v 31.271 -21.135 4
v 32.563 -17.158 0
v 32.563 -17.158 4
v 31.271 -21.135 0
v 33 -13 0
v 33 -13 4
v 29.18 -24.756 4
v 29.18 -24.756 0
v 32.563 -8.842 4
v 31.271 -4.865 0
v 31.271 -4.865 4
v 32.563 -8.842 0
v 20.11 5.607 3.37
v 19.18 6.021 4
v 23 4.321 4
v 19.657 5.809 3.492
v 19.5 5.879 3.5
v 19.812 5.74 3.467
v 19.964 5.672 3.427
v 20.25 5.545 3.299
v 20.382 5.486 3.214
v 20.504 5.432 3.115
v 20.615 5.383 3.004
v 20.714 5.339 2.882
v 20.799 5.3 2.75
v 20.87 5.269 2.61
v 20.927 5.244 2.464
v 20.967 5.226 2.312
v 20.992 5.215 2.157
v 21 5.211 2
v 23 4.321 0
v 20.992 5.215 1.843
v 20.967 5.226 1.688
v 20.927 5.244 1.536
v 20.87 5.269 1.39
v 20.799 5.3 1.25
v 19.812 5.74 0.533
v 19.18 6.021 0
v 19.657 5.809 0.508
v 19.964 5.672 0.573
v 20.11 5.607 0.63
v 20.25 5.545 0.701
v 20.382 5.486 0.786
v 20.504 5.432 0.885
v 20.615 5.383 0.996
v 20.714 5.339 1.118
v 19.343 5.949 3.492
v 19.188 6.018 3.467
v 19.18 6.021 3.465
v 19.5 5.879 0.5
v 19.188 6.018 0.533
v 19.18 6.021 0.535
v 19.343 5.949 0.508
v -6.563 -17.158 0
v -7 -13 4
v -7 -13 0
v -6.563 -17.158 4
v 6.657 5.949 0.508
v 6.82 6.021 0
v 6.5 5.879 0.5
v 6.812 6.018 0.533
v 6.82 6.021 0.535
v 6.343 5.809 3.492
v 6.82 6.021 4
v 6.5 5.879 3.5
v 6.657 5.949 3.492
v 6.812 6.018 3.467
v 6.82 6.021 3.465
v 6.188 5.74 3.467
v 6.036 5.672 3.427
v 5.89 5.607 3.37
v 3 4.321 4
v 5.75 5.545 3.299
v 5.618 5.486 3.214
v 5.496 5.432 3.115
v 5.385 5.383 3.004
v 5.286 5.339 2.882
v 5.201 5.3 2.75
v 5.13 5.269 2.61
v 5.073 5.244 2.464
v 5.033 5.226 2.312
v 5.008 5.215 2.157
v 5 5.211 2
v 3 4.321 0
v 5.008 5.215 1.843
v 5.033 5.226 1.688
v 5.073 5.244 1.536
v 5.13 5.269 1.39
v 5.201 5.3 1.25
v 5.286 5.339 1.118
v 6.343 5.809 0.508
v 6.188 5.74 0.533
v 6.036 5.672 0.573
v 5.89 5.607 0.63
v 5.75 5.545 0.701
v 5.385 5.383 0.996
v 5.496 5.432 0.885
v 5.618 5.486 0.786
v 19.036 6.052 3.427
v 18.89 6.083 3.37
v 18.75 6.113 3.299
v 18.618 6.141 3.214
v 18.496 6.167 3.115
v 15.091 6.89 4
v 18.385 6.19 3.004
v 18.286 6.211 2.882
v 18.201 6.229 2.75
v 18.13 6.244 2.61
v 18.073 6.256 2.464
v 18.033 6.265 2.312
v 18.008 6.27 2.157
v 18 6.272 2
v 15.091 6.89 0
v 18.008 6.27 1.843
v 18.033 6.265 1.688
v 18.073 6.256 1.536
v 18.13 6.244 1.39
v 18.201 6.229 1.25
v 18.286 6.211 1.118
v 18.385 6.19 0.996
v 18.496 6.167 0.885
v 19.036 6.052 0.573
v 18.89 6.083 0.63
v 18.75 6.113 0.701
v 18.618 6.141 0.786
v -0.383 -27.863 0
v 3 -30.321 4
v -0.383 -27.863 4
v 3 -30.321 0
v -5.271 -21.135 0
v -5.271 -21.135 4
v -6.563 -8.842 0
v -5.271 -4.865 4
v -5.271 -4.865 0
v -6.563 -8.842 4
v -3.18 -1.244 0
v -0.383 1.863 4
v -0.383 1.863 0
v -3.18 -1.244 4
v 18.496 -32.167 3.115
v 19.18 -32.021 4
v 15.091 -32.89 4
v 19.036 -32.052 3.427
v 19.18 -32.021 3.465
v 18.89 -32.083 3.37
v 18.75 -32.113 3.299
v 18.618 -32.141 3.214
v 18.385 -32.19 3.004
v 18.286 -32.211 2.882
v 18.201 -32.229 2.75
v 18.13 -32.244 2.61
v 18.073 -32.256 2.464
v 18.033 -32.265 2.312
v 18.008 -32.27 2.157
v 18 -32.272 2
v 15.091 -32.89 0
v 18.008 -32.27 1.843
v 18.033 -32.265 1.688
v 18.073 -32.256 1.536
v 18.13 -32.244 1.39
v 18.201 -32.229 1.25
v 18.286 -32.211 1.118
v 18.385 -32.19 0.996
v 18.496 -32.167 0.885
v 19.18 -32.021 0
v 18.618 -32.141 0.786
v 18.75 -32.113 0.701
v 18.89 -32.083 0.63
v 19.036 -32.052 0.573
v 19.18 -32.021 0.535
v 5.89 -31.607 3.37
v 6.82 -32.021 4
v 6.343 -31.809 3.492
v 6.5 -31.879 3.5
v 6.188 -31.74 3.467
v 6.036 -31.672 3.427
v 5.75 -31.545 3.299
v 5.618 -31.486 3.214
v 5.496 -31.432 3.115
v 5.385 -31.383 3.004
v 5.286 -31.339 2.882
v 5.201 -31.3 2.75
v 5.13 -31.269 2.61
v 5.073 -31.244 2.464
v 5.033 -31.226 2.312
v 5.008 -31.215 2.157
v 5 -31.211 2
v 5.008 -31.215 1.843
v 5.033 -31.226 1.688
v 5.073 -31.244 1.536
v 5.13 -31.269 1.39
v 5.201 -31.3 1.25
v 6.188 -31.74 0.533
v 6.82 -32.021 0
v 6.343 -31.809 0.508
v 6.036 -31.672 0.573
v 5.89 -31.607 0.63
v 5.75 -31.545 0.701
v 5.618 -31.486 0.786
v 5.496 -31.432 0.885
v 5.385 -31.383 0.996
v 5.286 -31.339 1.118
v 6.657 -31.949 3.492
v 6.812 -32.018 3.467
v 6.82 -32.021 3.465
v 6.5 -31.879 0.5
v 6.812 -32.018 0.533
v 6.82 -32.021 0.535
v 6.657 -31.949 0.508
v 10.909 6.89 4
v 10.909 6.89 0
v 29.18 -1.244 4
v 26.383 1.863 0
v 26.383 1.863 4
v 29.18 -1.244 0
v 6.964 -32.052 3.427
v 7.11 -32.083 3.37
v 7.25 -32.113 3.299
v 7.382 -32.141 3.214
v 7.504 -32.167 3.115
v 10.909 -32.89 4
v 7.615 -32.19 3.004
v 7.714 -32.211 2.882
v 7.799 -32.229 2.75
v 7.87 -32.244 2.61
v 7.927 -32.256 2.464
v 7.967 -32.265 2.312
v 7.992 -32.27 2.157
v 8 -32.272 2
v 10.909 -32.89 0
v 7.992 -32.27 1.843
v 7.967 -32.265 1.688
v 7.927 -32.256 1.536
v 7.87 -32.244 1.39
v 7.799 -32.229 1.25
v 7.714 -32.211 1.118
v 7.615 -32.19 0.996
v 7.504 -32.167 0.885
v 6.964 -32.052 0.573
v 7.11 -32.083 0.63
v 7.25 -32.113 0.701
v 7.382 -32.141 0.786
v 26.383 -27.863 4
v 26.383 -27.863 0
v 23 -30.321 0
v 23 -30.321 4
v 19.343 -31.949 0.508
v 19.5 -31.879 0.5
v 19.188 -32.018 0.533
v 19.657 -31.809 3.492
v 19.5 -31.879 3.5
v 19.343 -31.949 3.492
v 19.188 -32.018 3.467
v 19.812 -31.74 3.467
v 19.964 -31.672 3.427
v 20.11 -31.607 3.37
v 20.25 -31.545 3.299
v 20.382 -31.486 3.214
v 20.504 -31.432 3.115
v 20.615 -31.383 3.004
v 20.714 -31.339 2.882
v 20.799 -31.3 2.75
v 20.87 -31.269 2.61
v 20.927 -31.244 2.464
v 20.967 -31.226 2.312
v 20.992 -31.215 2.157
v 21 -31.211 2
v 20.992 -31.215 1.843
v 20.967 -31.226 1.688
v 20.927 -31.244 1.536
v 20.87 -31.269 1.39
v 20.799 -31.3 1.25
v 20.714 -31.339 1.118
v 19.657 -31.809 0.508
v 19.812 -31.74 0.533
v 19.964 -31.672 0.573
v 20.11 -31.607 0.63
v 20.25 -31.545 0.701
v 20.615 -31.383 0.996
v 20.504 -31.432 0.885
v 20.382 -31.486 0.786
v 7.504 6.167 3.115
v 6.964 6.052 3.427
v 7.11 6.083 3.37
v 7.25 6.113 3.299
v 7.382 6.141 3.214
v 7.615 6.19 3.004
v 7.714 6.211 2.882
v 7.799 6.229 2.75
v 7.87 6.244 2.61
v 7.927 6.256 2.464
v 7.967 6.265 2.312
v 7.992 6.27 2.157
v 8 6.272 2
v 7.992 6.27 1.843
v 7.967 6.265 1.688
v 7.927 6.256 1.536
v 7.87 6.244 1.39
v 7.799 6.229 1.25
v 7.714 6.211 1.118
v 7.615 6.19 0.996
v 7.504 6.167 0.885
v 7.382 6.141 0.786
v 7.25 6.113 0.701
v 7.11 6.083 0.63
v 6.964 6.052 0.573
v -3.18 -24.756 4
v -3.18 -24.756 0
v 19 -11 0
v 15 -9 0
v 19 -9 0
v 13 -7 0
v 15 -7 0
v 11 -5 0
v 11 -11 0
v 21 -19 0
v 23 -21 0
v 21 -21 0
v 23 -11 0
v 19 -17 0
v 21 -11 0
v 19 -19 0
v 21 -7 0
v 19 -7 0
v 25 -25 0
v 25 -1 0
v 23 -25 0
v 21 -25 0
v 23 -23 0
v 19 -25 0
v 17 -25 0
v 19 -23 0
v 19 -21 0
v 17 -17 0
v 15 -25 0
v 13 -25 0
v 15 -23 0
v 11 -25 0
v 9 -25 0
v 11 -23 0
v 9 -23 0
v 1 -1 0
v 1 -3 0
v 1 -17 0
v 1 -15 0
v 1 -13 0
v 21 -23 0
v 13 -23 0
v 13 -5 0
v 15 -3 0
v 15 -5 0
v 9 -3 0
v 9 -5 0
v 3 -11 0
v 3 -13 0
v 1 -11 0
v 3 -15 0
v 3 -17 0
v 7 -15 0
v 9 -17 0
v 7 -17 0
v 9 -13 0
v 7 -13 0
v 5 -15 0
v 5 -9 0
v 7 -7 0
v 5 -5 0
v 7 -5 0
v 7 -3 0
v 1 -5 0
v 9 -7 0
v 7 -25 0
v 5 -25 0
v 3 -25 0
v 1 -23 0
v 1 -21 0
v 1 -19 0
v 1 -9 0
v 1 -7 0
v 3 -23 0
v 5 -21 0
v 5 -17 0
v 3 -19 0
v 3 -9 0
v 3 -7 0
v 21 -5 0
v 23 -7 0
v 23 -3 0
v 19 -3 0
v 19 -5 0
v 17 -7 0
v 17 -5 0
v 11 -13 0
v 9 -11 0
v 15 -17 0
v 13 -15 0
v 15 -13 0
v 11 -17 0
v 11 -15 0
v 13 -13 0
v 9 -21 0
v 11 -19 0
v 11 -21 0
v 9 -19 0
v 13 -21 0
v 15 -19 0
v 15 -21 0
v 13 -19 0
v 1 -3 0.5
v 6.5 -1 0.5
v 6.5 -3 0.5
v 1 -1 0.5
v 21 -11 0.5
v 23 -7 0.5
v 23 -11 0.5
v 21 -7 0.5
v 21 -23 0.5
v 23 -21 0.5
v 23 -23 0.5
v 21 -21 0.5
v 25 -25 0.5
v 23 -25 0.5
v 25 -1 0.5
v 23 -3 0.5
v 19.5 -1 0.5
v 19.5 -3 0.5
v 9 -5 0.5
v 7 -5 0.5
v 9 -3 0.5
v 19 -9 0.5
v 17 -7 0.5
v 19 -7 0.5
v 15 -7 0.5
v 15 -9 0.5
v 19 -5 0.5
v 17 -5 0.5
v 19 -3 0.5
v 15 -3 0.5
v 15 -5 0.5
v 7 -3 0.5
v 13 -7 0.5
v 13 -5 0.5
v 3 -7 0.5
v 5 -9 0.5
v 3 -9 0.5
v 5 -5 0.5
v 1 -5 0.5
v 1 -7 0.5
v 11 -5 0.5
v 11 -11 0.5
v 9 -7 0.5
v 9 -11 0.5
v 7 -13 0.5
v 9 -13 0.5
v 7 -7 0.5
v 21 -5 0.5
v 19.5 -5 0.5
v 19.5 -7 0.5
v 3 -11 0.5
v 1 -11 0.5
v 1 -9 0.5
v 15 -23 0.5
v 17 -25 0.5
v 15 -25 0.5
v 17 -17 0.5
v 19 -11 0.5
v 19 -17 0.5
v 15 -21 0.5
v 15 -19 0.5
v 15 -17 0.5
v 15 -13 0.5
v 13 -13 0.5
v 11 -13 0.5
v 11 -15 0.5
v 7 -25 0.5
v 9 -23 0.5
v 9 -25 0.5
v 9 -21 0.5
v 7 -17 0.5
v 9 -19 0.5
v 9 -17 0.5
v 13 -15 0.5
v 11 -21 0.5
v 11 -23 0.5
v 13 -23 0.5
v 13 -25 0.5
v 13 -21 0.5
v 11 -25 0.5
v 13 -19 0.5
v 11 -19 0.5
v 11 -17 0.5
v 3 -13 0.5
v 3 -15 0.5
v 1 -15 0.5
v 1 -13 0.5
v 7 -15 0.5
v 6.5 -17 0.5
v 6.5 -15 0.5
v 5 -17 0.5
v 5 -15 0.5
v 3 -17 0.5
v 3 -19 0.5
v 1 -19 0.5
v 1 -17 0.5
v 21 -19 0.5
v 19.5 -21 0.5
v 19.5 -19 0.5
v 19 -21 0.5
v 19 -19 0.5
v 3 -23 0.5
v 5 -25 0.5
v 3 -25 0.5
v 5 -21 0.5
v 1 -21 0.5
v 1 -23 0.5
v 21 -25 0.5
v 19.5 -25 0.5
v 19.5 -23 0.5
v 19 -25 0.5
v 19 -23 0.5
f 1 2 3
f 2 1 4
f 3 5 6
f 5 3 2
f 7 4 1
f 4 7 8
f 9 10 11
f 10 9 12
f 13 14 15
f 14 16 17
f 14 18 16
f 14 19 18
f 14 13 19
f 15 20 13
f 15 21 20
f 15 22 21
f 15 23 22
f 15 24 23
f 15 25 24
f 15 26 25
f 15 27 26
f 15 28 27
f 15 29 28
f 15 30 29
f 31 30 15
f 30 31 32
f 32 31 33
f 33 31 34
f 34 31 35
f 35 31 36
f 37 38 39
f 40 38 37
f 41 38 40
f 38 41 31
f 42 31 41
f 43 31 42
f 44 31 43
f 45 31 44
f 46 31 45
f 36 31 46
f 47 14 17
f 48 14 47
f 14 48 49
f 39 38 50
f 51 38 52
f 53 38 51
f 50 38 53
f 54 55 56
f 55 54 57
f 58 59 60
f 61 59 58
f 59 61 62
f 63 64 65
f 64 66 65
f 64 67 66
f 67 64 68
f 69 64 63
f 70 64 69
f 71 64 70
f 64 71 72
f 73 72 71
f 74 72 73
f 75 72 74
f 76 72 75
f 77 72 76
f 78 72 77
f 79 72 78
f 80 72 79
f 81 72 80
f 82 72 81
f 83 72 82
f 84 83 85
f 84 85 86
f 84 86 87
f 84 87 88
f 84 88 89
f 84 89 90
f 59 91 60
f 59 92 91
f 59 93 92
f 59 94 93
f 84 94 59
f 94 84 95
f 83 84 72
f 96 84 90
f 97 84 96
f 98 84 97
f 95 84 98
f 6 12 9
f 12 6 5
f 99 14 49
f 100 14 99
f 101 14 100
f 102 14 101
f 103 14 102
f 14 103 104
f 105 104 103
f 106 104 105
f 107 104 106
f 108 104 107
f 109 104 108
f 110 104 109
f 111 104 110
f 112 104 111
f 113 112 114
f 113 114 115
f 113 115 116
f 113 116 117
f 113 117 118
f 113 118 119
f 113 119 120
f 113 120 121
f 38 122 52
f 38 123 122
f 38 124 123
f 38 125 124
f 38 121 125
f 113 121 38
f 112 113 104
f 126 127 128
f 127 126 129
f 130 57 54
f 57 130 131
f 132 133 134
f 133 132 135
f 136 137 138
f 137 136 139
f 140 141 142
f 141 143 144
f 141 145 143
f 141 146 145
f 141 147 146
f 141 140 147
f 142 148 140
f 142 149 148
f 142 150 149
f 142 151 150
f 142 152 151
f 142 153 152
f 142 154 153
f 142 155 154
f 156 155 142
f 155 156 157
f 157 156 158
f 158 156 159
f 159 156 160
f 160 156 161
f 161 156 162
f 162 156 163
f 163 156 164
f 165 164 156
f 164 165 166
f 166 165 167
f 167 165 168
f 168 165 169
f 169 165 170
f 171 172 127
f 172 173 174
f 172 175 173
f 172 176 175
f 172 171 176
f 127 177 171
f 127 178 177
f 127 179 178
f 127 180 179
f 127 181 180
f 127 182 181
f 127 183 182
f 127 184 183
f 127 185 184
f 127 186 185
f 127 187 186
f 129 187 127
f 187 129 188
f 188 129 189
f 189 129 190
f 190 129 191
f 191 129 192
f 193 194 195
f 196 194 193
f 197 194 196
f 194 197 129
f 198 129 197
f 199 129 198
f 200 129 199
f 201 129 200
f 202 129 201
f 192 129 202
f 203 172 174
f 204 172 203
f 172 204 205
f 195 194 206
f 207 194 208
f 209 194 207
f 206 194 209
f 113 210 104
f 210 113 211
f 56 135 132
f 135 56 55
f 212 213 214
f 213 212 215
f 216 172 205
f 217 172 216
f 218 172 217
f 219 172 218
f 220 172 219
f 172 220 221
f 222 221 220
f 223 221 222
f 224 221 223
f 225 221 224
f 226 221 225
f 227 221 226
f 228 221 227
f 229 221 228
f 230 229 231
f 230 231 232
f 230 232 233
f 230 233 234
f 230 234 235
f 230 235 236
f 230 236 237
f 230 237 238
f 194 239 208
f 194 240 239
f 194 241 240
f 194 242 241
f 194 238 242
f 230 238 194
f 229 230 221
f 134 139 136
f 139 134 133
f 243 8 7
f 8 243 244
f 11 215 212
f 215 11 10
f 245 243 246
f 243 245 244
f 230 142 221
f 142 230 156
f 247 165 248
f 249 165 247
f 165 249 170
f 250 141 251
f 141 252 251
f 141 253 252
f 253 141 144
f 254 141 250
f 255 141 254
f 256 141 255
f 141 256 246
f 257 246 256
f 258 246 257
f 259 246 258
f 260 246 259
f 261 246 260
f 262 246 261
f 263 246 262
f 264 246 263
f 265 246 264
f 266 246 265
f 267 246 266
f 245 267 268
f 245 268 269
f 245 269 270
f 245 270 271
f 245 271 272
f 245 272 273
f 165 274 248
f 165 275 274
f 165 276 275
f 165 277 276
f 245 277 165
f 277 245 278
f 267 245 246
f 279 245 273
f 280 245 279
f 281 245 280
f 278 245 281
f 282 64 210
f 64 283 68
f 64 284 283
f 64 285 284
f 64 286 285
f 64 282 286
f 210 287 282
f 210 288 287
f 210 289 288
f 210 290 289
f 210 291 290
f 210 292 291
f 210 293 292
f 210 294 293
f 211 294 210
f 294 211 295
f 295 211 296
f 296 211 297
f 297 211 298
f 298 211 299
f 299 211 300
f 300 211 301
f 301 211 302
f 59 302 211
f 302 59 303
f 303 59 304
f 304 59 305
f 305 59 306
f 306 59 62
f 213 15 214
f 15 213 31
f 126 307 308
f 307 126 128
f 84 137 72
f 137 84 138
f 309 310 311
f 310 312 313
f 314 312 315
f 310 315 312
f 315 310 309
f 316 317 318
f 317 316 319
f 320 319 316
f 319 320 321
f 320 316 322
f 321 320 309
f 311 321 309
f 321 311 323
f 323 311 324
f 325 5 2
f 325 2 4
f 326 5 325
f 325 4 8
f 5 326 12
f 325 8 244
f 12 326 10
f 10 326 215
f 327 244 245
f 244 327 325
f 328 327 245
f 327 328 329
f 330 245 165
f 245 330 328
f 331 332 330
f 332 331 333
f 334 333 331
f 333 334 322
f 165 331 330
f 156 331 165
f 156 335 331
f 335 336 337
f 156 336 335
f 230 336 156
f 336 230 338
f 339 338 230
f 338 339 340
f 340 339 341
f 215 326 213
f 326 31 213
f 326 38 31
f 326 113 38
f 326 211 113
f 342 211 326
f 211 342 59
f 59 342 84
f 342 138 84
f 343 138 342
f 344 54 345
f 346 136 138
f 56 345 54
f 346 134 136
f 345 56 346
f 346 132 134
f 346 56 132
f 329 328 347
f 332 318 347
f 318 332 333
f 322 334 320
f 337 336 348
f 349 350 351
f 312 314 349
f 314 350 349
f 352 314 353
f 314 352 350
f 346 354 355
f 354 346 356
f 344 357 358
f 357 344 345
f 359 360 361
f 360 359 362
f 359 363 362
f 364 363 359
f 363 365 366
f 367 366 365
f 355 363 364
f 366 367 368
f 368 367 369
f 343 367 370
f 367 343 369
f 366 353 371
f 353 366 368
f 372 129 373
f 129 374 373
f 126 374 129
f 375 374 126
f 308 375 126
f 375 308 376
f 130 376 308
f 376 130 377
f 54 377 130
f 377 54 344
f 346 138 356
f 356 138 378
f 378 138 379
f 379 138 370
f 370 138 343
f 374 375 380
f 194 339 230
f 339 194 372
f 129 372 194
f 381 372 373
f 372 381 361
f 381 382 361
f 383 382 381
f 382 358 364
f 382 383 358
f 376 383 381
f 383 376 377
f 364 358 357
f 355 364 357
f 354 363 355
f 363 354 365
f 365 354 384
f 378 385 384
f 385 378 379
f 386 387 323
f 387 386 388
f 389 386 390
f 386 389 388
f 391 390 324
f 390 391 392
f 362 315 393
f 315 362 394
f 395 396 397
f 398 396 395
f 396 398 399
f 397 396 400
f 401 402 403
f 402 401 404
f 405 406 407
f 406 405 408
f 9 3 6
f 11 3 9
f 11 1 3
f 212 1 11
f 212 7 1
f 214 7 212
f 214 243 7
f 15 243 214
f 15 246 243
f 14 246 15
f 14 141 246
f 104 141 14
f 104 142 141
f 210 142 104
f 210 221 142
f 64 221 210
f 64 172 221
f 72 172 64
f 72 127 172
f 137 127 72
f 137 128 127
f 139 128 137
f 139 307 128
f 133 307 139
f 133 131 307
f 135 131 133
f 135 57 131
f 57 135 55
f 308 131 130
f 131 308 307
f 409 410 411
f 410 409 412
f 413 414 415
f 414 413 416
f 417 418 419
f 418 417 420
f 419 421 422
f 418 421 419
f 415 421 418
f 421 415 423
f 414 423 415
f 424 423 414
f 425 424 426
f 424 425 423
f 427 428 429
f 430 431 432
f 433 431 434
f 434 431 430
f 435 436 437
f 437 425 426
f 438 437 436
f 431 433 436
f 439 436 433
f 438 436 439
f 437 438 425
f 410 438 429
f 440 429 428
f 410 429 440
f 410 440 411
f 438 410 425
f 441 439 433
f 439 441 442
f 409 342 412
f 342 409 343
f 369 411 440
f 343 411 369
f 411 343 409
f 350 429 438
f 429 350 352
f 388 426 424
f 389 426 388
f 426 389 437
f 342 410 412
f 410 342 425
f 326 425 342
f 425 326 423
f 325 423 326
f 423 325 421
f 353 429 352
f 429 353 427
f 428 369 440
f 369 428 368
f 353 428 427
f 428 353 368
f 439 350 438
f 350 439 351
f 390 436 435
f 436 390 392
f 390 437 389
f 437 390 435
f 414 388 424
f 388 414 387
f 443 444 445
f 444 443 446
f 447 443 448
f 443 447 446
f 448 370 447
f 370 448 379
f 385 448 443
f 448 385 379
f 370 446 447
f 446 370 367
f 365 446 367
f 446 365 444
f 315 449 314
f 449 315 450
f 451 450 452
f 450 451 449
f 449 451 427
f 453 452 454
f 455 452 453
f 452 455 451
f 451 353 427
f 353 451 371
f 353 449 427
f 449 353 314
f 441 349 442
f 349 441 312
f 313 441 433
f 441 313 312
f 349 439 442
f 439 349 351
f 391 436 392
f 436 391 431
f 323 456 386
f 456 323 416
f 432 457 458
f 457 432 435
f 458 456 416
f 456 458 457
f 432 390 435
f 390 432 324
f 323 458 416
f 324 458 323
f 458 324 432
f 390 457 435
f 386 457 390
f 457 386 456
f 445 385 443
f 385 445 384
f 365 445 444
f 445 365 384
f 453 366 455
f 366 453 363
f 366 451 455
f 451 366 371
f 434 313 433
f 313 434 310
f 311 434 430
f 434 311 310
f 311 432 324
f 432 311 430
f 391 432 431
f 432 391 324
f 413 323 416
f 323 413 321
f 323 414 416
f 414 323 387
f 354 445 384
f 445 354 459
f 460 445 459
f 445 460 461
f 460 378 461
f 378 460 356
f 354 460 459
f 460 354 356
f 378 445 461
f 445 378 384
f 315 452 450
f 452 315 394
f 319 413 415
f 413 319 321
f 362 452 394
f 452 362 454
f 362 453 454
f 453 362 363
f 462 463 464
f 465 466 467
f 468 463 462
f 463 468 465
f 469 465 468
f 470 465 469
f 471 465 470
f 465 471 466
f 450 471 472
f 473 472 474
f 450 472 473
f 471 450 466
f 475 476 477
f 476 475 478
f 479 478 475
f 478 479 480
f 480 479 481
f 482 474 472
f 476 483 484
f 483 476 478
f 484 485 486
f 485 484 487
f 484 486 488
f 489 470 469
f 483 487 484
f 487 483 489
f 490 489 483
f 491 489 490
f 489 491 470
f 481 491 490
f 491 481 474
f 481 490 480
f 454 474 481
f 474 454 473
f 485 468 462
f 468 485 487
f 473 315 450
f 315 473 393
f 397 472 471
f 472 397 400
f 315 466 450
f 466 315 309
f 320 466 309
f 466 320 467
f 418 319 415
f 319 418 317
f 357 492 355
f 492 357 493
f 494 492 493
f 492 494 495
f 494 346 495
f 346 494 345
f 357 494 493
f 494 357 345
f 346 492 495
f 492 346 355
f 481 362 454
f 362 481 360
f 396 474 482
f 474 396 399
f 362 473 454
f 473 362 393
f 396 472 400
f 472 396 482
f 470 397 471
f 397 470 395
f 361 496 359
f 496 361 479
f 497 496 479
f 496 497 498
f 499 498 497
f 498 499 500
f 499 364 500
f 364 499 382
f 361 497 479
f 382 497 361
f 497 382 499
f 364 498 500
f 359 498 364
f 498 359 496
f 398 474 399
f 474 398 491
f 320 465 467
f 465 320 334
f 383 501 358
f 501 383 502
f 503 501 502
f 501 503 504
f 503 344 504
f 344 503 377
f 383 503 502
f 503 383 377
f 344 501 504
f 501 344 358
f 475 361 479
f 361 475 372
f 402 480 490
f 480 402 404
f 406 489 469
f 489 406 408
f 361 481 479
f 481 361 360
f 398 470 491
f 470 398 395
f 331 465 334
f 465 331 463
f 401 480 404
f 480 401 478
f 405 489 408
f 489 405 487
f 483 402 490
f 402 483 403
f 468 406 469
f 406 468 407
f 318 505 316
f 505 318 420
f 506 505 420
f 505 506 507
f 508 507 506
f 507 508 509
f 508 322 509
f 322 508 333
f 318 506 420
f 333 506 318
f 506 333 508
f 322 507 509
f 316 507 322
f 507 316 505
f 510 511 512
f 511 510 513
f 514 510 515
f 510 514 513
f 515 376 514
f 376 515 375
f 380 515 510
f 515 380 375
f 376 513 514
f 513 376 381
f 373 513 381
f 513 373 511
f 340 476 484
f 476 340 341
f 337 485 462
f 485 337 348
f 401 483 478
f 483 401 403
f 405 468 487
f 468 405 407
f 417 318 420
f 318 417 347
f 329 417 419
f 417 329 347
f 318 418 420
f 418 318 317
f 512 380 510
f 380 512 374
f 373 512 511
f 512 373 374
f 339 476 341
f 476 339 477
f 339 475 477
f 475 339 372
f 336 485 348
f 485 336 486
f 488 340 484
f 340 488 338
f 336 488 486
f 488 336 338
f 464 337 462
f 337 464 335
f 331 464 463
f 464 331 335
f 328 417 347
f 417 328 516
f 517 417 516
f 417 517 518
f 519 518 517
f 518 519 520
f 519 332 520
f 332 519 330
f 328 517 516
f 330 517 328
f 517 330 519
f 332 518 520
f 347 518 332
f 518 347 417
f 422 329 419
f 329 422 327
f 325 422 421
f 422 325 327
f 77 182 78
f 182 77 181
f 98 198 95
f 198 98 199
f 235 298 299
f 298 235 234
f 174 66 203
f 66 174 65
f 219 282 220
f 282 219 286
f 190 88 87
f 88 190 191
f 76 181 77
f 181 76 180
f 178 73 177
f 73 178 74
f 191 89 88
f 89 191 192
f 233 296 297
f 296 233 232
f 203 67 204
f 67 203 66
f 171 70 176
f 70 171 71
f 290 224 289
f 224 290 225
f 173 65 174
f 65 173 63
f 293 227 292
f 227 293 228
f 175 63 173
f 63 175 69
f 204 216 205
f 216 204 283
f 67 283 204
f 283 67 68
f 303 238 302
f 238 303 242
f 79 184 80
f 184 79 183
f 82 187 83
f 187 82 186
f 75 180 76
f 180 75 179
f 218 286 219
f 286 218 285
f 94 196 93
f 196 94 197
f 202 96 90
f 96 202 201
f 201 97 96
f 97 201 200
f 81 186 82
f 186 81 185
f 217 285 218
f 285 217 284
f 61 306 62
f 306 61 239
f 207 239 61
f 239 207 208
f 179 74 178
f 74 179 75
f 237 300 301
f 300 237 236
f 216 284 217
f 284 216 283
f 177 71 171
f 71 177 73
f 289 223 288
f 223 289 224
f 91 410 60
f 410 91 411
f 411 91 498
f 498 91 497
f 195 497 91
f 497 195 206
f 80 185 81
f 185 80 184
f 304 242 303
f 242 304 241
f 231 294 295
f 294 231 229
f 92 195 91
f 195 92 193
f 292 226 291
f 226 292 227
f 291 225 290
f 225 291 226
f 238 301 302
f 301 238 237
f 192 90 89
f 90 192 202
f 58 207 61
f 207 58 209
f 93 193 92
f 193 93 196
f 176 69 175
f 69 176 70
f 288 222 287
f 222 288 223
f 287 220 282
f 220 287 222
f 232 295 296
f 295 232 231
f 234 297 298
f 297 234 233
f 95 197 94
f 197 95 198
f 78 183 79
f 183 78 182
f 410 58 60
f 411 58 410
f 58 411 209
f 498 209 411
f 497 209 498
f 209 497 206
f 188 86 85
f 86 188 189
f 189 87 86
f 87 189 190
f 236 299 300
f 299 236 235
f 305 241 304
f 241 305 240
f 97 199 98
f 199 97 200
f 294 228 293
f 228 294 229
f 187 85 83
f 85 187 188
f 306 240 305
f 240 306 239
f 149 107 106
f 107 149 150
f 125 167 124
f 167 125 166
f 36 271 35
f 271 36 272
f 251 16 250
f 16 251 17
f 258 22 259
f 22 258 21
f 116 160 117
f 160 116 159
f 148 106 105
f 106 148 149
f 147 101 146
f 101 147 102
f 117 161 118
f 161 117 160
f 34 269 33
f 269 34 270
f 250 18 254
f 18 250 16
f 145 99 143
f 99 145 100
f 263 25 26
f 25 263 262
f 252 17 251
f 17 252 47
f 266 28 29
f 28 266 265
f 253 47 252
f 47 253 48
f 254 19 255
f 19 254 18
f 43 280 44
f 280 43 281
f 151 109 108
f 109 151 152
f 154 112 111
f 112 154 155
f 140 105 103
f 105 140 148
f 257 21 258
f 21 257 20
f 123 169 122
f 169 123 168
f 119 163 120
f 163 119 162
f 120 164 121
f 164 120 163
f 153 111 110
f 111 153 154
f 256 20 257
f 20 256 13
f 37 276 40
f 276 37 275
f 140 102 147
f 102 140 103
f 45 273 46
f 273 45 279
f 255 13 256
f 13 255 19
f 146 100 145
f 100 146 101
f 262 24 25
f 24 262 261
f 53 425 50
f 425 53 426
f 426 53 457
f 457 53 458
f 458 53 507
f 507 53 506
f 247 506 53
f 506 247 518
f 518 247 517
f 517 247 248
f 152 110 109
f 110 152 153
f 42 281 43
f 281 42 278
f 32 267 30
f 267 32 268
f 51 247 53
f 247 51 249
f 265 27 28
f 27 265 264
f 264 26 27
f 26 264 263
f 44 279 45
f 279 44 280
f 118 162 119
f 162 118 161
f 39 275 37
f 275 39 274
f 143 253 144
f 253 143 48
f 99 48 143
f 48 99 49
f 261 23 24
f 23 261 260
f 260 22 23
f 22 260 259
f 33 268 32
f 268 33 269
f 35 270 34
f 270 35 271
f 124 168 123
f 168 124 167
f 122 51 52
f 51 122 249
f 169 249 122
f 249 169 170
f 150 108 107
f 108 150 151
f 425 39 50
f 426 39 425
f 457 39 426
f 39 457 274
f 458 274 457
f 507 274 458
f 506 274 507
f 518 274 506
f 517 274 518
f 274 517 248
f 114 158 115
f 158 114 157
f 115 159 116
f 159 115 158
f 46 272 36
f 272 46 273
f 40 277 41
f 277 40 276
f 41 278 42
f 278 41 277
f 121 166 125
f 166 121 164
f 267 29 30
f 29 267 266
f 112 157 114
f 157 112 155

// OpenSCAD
rotate([180,0,0])difference(){translate([13,13,-2])  cylinder(r=20,h=4, center=true);
translate([2,2,0])  cube(size = [2,2,1], center=true);
translate([4,2,0])  cube(size = [2,2,1], center=true);
translate([6,2,0])  cube(size = [2,2,1], center=true);
translate([8,2,0])  cube(size = [2,2,1], center=true);
translate([10,2,0])  cube(size = [2,2,1], center=true);
translate([12,2,0])  cube(size = [2,2,1], center=true);
translate([14,2,0])  cube(size = [2,2,1], center=true);
translate([16,2,0])  cube(size = [2,2,1], center=true);
translate([18,2,0])  cube(size = [2,2,1], center=true);
translate([20,2,0])  cube(size = [2,2,1], center=true);
translate([22,2,0])  cube(size = [2,2,1], center=true);
translate([24,2,0])  cube(size = [2,2,1], center=true);
translate([24,2,0])  cube(size = [2,2,1], center=true);
translate([24,2,0])  cube(size = [2,2,1], center=true);
translate([24,2,0])  cube(size = [2,2,1], center=true);
translate([8,4,0])  cube(size = [2,2,1], center=true);
translate([8,4,0])  cube(size = [2,2,1], center=true);
translate([8,4,0])  cube(size = [2,2,1], center=true);
translate([8,4,0])  cube(size = [2,2,1], center=true);
translate([16,4,0])  cube(size = [2,2,1], center=true);
translate([18,4,0])  cube(size = [2,2,1], center=true);
translate([18,4,0])  cube(size = [2,2,1], center=true);
translate([18,4,0])  cube(size = [2,2,1], center=true);
translate([24,4,0])  cube(size = [2,2,1], center=true);
translate([2,6,0])  cube(size = [2,2,1], center=true);
translate([4,6,0])  cube(size = [2,2,1], center=true);
translate([4,6,0])  cube(size = [2,2,1], center=true);
translate([4,6,0])  cube(size = [2,2,1], center=true);
translate([10,6,0])  cube(size = [2,2,1], center=true);
translate([10,6,0])  cube(size = [2,2,1], center=true);
translate([14,6,0])  cube(size = [2,2,1], center=true);
translate([16,6,0])  cube(size = [2,2,1], center=true);
translate([16,6,0])  cube(size = [2,2,1], center=true);
translate([20,6,0])  cube(size = [2,2,1], center=true);
translate([20,6,0])  cube(size = [2,2,1], center=true);
translate([24,6,0])  cube(size = [2,2,1], center=true);
translate([24,6,0])  cube(size = [2,2,1], center=true);
translate([4,8,0])  cube(size = [2,2,1], center=true);
translate([4,8,0])  cube(size = [2,2,1], center=true);
translate([8,8,0])  cube(size = [2,2,1], center=true);
translate([10,8,0])  cube(size = [2,2,1], center=true);
translate([10,8,0])  cube(size = [2,2,1], center=true);
translate([10,8,0])  cube(size = [2,2,1], center=true);
translate([16,8,0])  cube(size = [2,2,1], center=true);
translate([18,8,0])  cube(size = [2,2,1], center=true);
translate([18,8,0])  cube(size = [2,2,1], center=true);
translate([22,8,0])  cube(size = [2,2,1], center=true);
translate([24,8,0])  cube(size = [2,2,1], center=true);
translate([2,10,0])  cube(size = [2,2,1], center=true);
translate([2,10,0])  cube(size = [2,2,1], center=true);
translate([2,10,0])  cube(size = [2,2,1], center=true);
translate([8,10,0])  cube(size = [2,2,1], center=true);
translate([10,10,0])  cube(size = [2,2,1], center=true);
translate([10,10,0])  cube(size = [2,2,1], center=true);
translate([10,10,0])  cube(size = [2,2,1], center=true);
translate([10,10,0])  cube(size = [2,2,1], center=true);
translate([10,10,0])  cube(size = [2,2,1], center=true);
translate([10,10,0])  cube(size = [2,2,1], center=true);
translate([22,10,0])  cube(size = [2,2,1], center=true);
translate([24,10,0])  cube(size = [2,2,1], center=true);
translate([24,10,0])  cube(size = [2,2,1], center=true);
translate([24,10,0])  cube(size = [2,2,1], center=true);
translate([24,10,0])  cube(size = [2,2,1], center=true);
translate([8,12,0])  cube(size = [2,2,1], center=true);
translate([8,12,0])  cube(size = [2,2,1], center=true);
translate([12,12,0])  cube(size = [2,2,1], center=true);
translate([14,12,0])  cube(size = [2,2,1], center=true);
translate([16,12,0])  cube(size = [2,2,1], center=true);
translate([18,12,0])  cube(size = [2,2,1], center=true);
translate([18,12,0])  cube(size = [2,2,1], center=true);
translate([18,12,0])  cube(size = [2,2,1], center=true);
translate([24,12,0])  cube(size = [2,2,1], center=true);
translate([2,14,0])  cube(size = [2,2,1], center=true);
translate([2,14,0])  cube(size = [2,2,1], center=true);
translate([2,14,0])  cube(size = [2,2,1], center=true);
translate([2,14,0])  cube(size = [2,2,1], center=true);
translate([10,14,0])  cube(size = [2,2,1], center=true);
translate([12,14,0])  cube(size = [2,2,1], center=true);
translate([12,14,0])  cube(size = [2,2,1], center=true);
translate([16,14,0])  cube(size = [2,2,1], center=true);
translate([18,14,0])  cube(size = [2,2,1], center=true);
translate([18,14,0])  cube(size = [2,2,1], center=true);
translate([18,14,0])  cube(size = [2,2,1], center=true);
translate([24,14,0])  cube(size = [2,2,1], center=true);
translate([24,14,0])  cube(size = [2,2,1], center=true);
translate([24,14,0])  cube(size = [2,2,1], center=true);
translate([6,16,0])  cube(size = [2,2,1], center=true);
translate([6,16,0])  cube(size = [2,2,1], center=true);
translate([10,16,0])  cube(size = [2,2,1], center=true);
translate([10,16,0])  cube(size = [2,2,1], center=true);
translate([10,16,0])  cube(size = [2,2,1], center=true);
translate([16,16,0])  cube(size = [2,2,1], center=true);
translate([18,16,0])  cube(size = [2,2,1], center=true);
translate([18,16,0])  cube(size = [2,2,1], center=true);
translate([18,16,0])  cube(size = [2,2,1], center=true);
translate([24,16,0])  cube(size = [2,2,1], center=true);
translate([2,18,0])  cube(size = [2,2,1], center=true);
translate([2,18,0])  cube(size = [2,2,1], center=true);
translate([2,18,0])  cube(size = [2,2,1], center=true);
translate([8,18,0])  cube(size = [2,2,1], center=true);
translate([10,18,0])  cube(size = [2,2,1], center=true);
translate([12,18,0])  cube(size = [2,2,1], center=true);
translate([14,18,0])  cube(size = [2,2,1], center=true);
translate([16,18,0])  cube(size = [2,2,1], center=true);
translate([16,18,0])  cube(size = [2,2,1], center=true);
translate([16,18,0])  cube(size = [2,2,1], center=true);
translate([16,18,0])  cube(size = [2,2,1], center=true);
translate([24,18,0])  cube(size = [2,2,1], center=true);
translate([24,18,0])  cube(size = [2,2,1], center=true);
translate([24,18,0])  cube(size = [2,2,1], center=true);
translate([24,18,0])  cube(size = [2,2,1], center=true);
translate([8,20,0])  cube(size = [2,2,1], center=true);
translate([8,20,0])  cube(size = [2,2,1], center=true);
translate([12,20,0])  cube(size = [2,2,1], center=true);
translate([12,20,0])  cube(size = [2,2,1], center=true);
translate([16,20,0])  cube(size = [2,2,1], center=true);
translate([16,20,0])  cube(size = [2,2,1], center=true);
translate([20,20,0])  cube(size = [2,2,1], center=true);
translate([20,20,0])  cube(size = [2,2,1], center=true);
translate([24,20,0])  cube(size = [2,2,1], center=true);
translate([2,22,0])  cube(size = [2,2,1], center=true);
translate([4,22,0])  cube(size = [2,2,1], center=true);
translate([4,22,0])  cube(size = [2,2,1], center=true);
translate([8,22,0])  cube(size = [2,2,1], center=true);
translate([10,22,0])  cube(size = [2,2,1], center=true);
translate([12,22,0])  cube(size = [2,2,1], center=true);
translate([14,22,0])  cube(size = [2,2,1], center=true);
translate([16,22,0])  cube(size = [2,2,1], center=true);
translate([16,22,0])  cube(size = [2,2,1], center=true);
translate([16,22,0])  cube(size = [2,2,1], center=true);
translate([22,22,0])  cube(size = [2,2,1], center=true);
translate([24,22,0])  cube(size = [2,2,1], center=true);
translate([24,22,0])  cube(size = [2,2,1], center=true);
translate([4,24,0])  cube(size = [2,2,1], center=true);
translate([4,24,0])  cube(size = [2,2,1], center=true);
translate([8,24,0])  cube(size = [2,2,1], center=true);
translate([8,24,0])  cube(size = [2,2,1], center=true);
translate([12,24,0])  cube(size = [2,2,1], center=true);
translate([12,24,0])  cube(size = [2,2,1], center=true);
translate([16,24,0])  cube(size = [2,2,1], center=true);
translate([16,24,0])  cube(size = [2,2,1], center=true);
translate([20,24,0])  cube(size = [2,2,1], center=true);
translate([20,24,0])  cube(size = [2,2,1], center=true);
translate([24,24,0])  cube(size = [2,2,1], center=true);
rotate([90,90,0])translate([2,6.5,0])  cylinder(r=1.5,h=400, $fn=60, center=true);
rotate([90,90,0])translate([2,19.5,0])  cylinder(r=1.5,h=400, $fn=60, center=true);
}
